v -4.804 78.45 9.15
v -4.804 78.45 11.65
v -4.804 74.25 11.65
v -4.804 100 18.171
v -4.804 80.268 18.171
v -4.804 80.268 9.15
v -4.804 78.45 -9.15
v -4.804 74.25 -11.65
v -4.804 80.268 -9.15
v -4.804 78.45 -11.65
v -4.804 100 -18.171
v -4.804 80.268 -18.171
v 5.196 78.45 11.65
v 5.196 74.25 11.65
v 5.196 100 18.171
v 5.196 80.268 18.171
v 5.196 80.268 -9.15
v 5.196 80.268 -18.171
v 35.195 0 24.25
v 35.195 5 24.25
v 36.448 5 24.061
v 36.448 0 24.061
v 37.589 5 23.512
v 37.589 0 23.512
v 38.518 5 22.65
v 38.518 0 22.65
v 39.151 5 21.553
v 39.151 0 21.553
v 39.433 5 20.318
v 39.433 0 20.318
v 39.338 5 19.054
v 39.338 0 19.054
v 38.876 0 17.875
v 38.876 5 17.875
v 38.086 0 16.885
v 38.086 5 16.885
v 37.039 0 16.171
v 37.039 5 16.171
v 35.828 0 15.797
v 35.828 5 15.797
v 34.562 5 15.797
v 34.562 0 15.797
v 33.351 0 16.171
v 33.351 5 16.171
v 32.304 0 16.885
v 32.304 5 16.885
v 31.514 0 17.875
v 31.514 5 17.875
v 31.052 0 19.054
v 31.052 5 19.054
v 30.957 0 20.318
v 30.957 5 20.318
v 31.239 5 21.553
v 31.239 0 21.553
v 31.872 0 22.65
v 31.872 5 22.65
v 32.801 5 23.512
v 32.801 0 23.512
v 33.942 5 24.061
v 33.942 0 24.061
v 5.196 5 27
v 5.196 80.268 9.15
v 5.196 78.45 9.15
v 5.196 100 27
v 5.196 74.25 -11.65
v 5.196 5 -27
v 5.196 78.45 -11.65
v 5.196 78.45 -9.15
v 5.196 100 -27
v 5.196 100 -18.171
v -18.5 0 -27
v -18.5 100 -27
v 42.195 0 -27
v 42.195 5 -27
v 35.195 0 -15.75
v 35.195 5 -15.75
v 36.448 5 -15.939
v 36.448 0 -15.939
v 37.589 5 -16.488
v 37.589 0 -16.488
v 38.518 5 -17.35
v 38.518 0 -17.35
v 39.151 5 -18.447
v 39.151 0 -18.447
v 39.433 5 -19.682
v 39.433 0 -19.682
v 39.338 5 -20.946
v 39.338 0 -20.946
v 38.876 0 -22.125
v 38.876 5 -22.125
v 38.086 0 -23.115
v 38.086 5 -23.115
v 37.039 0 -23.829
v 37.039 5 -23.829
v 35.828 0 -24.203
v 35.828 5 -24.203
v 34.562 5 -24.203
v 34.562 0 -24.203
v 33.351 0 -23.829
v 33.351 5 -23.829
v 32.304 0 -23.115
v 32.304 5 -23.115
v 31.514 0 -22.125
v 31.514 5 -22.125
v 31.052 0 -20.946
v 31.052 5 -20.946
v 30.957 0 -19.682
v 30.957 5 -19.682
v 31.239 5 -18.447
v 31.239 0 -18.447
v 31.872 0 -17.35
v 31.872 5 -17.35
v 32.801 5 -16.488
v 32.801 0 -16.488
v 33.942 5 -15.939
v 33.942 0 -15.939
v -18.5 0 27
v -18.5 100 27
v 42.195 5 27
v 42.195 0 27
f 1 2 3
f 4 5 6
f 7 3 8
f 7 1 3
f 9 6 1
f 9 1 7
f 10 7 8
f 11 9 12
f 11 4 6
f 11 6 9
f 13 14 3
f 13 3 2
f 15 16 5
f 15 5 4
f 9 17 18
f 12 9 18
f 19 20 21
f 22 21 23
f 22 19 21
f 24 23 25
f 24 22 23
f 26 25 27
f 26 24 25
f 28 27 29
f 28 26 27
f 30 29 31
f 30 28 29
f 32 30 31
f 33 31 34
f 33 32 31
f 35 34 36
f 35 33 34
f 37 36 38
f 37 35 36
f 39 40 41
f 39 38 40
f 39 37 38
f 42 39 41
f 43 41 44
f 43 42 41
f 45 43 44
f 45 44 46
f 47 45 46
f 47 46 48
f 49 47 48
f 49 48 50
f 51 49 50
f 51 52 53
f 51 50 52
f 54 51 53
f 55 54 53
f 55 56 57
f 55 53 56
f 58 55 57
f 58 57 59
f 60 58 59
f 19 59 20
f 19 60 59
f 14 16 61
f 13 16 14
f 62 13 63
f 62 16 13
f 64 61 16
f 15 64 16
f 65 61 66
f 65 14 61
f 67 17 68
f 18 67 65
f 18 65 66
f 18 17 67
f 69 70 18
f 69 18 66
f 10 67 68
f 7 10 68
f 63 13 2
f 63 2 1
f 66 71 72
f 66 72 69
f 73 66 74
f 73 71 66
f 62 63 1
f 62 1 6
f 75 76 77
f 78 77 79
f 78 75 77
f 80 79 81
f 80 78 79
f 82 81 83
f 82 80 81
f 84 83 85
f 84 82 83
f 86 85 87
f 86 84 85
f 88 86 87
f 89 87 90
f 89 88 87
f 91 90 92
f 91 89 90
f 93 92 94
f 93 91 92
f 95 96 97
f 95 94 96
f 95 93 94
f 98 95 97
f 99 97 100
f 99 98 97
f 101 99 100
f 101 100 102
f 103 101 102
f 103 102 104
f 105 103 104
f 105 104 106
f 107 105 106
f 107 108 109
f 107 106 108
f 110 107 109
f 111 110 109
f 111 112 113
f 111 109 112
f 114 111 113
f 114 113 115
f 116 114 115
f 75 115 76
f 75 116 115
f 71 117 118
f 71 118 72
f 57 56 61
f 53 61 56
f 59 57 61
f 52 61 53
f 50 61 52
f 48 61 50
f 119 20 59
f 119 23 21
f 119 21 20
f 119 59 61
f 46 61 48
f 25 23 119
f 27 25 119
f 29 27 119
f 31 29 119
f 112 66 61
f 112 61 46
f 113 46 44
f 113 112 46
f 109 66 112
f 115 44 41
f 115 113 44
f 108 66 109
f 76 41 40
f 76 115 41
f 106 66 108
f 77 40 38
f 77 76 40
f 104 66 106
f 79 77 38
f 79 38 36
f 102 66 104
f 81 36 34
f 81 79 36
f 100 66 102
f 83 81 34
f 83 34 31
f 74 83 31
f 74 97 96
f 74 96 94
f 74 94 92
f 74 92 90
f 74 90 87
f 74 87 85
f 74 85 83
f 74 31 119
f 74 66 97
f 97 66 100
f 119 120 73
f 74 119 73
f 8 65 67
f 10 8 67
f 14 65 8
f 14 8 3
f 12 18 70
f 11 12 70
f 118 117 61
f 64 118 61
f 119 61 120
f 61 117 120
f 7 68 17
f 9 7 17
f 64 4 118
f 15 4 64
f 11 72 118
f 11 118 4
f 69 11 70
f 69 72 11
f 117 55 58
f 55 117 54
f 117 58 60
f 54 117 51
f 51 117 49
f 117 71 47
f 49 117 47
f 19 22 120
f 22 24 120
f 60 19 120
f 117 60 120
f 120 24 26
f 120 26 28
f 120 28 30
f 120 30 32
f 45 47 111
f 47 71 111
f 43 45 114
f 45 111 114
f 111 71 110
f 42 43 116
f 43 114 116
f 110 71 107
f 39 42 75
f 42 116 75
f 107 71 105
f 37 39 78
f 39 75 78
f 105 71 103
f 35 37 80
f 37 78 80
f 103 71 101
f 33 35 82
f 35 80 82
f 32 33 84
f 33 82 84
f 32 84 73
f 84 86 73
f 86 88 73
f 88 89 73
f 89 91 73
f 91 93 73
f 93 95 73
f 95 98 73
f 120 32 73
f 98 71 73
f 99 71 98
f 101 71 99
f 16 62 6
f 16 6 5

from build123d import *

# Parameters (mm, degrees)
SKETCH1_W            = 84.39
SKETCH1_H            = 54
SKETCH1_R            = 4.25
BOSS_EXTRUDE1_DEPTH  = 100
CUT_EXTRUDE1_DEPTH   = 10
SKETCH3_W            = 36.999403
SKETCH3_H            = 54
CUT_EXTRUDE2_DEPTH   = 95
MIRROR2_COPY_1_DEPTH = 10
CUT_EXTRUDE3_REACH   = 122.054
SKETCH4_W            = 141.405079451
SKETCH4_H            = 141.172887202


with BuildPart() as part:
    # Sketch1 → Boss-Extrude1 (new body)
    with BuildSketch(Plane(origin=(0, 0, 0), x_dir=(1, 0, 0), z_dir=(0, 1, 0))):
        Rectangle(SKETCH1_W, SKETCH1_H)
        with Locations(Location((35.195, 20, 0), (0, 0, 270))):
            Circle(SKETCH1_R, mode=Mode.SUBTRACT)
        with Locations(Location((35.195, -20, 0), (0, 0, 270))):
            Circle(SKETCH1_R, mode=Mode.SUBTRACT)
    extrude(amount=BOSS_EXTRUDE1_DEPTH)

    # Sketch2 → Cut-Extrude1 (cut)
    with BuildSketch(Plane.ZY.offset(42.195)):
        Polygon((-11.65, 78.45), (-9.15, 78.45), (-9.15, 80.267556596), (-18.171447478, 80.267556596), (-18.171447478, 100), (0, 100), (0, 74.25), (-11.65, 74.25), align=None)
    cut_extrude1 = extrude(amount=-CUT_EXTRUDE1_DEPTH, mode=Mode.SUBTRACT)

    # Sketch3 → Cut-Extrude2 (cut)
    with BuildSketch(Plane(origin=(0, 100, 0), x_dir=(1, 0, 0), z_dir=(0, 1, 0))):
        with Locations((23.6952985, 0)):
            Rectangle(SKETCH3_W, SKETCH3_H)
    extrude(amount=-CUT_EXTRUDE2_DEPTH, mode=Mode.SUBTRACT)

    # Mirror1: Cut-Extrude1 across plane
    add(cut_extrude1.mirror(Plane.XY), mode=Mode.SUBTRACT)

    # Mirror2: Cut-Extrude1 across plane
    add(cut_extrude1.mirror(Plane(origin=(-18.4997015, 0, 0), x_dir=(0, 0, 1), z_dir=(1, 0, 0))), mode=Mode.SUBTRACT)

    # Mirror2 copy 1 sketch → Mirror2 copy 1 (cut)
    with BuildSketch(Plane(origin=(5.195597, 0, 0), x_dir=(0, 0, -1), z_dir=(1, 0, 0))):
        Polygon((-11.65, 78.45), (-9.15, 78.45), (-9.15, 80.267556596), (-18.171447478, 80.267556596), (-18.171447478, 100), (0, 100), (0, 74.25), (-11.65, 74.25), align=None)
    extrude(amount=-MIRROR2_COPY_1_DEPTH, mode=Mode.SUBTRACT)

    # Sketch4 → Cut-Extrude3 (cut, up to next)
    with BuildSketch(Plane(origin=(-18.4997015, 0, 0), x_dir=(0, 0, -1), z_dir=(1, 0, 0)), mode=Mode.PRIVATE) as cut_extrude3_sk1:
        with Locations((22.522648123, 44.65957828)):
            Rectangle(SKETCH4_W, SKETCH4_H)
    cut_extrude3_tool1 = extrude(cut_extrude3_sk1.sketch, amount=-CUT_EXTRUDE3_REACH, mode=Mode.PRIVATE) & part.part
    add(cut_extrude3_tool1.solids().sort_by_distance((-18.499701, 44.659578, -22.522648))[0], mode=Mode.SUBTRACT)


solid = part.part
